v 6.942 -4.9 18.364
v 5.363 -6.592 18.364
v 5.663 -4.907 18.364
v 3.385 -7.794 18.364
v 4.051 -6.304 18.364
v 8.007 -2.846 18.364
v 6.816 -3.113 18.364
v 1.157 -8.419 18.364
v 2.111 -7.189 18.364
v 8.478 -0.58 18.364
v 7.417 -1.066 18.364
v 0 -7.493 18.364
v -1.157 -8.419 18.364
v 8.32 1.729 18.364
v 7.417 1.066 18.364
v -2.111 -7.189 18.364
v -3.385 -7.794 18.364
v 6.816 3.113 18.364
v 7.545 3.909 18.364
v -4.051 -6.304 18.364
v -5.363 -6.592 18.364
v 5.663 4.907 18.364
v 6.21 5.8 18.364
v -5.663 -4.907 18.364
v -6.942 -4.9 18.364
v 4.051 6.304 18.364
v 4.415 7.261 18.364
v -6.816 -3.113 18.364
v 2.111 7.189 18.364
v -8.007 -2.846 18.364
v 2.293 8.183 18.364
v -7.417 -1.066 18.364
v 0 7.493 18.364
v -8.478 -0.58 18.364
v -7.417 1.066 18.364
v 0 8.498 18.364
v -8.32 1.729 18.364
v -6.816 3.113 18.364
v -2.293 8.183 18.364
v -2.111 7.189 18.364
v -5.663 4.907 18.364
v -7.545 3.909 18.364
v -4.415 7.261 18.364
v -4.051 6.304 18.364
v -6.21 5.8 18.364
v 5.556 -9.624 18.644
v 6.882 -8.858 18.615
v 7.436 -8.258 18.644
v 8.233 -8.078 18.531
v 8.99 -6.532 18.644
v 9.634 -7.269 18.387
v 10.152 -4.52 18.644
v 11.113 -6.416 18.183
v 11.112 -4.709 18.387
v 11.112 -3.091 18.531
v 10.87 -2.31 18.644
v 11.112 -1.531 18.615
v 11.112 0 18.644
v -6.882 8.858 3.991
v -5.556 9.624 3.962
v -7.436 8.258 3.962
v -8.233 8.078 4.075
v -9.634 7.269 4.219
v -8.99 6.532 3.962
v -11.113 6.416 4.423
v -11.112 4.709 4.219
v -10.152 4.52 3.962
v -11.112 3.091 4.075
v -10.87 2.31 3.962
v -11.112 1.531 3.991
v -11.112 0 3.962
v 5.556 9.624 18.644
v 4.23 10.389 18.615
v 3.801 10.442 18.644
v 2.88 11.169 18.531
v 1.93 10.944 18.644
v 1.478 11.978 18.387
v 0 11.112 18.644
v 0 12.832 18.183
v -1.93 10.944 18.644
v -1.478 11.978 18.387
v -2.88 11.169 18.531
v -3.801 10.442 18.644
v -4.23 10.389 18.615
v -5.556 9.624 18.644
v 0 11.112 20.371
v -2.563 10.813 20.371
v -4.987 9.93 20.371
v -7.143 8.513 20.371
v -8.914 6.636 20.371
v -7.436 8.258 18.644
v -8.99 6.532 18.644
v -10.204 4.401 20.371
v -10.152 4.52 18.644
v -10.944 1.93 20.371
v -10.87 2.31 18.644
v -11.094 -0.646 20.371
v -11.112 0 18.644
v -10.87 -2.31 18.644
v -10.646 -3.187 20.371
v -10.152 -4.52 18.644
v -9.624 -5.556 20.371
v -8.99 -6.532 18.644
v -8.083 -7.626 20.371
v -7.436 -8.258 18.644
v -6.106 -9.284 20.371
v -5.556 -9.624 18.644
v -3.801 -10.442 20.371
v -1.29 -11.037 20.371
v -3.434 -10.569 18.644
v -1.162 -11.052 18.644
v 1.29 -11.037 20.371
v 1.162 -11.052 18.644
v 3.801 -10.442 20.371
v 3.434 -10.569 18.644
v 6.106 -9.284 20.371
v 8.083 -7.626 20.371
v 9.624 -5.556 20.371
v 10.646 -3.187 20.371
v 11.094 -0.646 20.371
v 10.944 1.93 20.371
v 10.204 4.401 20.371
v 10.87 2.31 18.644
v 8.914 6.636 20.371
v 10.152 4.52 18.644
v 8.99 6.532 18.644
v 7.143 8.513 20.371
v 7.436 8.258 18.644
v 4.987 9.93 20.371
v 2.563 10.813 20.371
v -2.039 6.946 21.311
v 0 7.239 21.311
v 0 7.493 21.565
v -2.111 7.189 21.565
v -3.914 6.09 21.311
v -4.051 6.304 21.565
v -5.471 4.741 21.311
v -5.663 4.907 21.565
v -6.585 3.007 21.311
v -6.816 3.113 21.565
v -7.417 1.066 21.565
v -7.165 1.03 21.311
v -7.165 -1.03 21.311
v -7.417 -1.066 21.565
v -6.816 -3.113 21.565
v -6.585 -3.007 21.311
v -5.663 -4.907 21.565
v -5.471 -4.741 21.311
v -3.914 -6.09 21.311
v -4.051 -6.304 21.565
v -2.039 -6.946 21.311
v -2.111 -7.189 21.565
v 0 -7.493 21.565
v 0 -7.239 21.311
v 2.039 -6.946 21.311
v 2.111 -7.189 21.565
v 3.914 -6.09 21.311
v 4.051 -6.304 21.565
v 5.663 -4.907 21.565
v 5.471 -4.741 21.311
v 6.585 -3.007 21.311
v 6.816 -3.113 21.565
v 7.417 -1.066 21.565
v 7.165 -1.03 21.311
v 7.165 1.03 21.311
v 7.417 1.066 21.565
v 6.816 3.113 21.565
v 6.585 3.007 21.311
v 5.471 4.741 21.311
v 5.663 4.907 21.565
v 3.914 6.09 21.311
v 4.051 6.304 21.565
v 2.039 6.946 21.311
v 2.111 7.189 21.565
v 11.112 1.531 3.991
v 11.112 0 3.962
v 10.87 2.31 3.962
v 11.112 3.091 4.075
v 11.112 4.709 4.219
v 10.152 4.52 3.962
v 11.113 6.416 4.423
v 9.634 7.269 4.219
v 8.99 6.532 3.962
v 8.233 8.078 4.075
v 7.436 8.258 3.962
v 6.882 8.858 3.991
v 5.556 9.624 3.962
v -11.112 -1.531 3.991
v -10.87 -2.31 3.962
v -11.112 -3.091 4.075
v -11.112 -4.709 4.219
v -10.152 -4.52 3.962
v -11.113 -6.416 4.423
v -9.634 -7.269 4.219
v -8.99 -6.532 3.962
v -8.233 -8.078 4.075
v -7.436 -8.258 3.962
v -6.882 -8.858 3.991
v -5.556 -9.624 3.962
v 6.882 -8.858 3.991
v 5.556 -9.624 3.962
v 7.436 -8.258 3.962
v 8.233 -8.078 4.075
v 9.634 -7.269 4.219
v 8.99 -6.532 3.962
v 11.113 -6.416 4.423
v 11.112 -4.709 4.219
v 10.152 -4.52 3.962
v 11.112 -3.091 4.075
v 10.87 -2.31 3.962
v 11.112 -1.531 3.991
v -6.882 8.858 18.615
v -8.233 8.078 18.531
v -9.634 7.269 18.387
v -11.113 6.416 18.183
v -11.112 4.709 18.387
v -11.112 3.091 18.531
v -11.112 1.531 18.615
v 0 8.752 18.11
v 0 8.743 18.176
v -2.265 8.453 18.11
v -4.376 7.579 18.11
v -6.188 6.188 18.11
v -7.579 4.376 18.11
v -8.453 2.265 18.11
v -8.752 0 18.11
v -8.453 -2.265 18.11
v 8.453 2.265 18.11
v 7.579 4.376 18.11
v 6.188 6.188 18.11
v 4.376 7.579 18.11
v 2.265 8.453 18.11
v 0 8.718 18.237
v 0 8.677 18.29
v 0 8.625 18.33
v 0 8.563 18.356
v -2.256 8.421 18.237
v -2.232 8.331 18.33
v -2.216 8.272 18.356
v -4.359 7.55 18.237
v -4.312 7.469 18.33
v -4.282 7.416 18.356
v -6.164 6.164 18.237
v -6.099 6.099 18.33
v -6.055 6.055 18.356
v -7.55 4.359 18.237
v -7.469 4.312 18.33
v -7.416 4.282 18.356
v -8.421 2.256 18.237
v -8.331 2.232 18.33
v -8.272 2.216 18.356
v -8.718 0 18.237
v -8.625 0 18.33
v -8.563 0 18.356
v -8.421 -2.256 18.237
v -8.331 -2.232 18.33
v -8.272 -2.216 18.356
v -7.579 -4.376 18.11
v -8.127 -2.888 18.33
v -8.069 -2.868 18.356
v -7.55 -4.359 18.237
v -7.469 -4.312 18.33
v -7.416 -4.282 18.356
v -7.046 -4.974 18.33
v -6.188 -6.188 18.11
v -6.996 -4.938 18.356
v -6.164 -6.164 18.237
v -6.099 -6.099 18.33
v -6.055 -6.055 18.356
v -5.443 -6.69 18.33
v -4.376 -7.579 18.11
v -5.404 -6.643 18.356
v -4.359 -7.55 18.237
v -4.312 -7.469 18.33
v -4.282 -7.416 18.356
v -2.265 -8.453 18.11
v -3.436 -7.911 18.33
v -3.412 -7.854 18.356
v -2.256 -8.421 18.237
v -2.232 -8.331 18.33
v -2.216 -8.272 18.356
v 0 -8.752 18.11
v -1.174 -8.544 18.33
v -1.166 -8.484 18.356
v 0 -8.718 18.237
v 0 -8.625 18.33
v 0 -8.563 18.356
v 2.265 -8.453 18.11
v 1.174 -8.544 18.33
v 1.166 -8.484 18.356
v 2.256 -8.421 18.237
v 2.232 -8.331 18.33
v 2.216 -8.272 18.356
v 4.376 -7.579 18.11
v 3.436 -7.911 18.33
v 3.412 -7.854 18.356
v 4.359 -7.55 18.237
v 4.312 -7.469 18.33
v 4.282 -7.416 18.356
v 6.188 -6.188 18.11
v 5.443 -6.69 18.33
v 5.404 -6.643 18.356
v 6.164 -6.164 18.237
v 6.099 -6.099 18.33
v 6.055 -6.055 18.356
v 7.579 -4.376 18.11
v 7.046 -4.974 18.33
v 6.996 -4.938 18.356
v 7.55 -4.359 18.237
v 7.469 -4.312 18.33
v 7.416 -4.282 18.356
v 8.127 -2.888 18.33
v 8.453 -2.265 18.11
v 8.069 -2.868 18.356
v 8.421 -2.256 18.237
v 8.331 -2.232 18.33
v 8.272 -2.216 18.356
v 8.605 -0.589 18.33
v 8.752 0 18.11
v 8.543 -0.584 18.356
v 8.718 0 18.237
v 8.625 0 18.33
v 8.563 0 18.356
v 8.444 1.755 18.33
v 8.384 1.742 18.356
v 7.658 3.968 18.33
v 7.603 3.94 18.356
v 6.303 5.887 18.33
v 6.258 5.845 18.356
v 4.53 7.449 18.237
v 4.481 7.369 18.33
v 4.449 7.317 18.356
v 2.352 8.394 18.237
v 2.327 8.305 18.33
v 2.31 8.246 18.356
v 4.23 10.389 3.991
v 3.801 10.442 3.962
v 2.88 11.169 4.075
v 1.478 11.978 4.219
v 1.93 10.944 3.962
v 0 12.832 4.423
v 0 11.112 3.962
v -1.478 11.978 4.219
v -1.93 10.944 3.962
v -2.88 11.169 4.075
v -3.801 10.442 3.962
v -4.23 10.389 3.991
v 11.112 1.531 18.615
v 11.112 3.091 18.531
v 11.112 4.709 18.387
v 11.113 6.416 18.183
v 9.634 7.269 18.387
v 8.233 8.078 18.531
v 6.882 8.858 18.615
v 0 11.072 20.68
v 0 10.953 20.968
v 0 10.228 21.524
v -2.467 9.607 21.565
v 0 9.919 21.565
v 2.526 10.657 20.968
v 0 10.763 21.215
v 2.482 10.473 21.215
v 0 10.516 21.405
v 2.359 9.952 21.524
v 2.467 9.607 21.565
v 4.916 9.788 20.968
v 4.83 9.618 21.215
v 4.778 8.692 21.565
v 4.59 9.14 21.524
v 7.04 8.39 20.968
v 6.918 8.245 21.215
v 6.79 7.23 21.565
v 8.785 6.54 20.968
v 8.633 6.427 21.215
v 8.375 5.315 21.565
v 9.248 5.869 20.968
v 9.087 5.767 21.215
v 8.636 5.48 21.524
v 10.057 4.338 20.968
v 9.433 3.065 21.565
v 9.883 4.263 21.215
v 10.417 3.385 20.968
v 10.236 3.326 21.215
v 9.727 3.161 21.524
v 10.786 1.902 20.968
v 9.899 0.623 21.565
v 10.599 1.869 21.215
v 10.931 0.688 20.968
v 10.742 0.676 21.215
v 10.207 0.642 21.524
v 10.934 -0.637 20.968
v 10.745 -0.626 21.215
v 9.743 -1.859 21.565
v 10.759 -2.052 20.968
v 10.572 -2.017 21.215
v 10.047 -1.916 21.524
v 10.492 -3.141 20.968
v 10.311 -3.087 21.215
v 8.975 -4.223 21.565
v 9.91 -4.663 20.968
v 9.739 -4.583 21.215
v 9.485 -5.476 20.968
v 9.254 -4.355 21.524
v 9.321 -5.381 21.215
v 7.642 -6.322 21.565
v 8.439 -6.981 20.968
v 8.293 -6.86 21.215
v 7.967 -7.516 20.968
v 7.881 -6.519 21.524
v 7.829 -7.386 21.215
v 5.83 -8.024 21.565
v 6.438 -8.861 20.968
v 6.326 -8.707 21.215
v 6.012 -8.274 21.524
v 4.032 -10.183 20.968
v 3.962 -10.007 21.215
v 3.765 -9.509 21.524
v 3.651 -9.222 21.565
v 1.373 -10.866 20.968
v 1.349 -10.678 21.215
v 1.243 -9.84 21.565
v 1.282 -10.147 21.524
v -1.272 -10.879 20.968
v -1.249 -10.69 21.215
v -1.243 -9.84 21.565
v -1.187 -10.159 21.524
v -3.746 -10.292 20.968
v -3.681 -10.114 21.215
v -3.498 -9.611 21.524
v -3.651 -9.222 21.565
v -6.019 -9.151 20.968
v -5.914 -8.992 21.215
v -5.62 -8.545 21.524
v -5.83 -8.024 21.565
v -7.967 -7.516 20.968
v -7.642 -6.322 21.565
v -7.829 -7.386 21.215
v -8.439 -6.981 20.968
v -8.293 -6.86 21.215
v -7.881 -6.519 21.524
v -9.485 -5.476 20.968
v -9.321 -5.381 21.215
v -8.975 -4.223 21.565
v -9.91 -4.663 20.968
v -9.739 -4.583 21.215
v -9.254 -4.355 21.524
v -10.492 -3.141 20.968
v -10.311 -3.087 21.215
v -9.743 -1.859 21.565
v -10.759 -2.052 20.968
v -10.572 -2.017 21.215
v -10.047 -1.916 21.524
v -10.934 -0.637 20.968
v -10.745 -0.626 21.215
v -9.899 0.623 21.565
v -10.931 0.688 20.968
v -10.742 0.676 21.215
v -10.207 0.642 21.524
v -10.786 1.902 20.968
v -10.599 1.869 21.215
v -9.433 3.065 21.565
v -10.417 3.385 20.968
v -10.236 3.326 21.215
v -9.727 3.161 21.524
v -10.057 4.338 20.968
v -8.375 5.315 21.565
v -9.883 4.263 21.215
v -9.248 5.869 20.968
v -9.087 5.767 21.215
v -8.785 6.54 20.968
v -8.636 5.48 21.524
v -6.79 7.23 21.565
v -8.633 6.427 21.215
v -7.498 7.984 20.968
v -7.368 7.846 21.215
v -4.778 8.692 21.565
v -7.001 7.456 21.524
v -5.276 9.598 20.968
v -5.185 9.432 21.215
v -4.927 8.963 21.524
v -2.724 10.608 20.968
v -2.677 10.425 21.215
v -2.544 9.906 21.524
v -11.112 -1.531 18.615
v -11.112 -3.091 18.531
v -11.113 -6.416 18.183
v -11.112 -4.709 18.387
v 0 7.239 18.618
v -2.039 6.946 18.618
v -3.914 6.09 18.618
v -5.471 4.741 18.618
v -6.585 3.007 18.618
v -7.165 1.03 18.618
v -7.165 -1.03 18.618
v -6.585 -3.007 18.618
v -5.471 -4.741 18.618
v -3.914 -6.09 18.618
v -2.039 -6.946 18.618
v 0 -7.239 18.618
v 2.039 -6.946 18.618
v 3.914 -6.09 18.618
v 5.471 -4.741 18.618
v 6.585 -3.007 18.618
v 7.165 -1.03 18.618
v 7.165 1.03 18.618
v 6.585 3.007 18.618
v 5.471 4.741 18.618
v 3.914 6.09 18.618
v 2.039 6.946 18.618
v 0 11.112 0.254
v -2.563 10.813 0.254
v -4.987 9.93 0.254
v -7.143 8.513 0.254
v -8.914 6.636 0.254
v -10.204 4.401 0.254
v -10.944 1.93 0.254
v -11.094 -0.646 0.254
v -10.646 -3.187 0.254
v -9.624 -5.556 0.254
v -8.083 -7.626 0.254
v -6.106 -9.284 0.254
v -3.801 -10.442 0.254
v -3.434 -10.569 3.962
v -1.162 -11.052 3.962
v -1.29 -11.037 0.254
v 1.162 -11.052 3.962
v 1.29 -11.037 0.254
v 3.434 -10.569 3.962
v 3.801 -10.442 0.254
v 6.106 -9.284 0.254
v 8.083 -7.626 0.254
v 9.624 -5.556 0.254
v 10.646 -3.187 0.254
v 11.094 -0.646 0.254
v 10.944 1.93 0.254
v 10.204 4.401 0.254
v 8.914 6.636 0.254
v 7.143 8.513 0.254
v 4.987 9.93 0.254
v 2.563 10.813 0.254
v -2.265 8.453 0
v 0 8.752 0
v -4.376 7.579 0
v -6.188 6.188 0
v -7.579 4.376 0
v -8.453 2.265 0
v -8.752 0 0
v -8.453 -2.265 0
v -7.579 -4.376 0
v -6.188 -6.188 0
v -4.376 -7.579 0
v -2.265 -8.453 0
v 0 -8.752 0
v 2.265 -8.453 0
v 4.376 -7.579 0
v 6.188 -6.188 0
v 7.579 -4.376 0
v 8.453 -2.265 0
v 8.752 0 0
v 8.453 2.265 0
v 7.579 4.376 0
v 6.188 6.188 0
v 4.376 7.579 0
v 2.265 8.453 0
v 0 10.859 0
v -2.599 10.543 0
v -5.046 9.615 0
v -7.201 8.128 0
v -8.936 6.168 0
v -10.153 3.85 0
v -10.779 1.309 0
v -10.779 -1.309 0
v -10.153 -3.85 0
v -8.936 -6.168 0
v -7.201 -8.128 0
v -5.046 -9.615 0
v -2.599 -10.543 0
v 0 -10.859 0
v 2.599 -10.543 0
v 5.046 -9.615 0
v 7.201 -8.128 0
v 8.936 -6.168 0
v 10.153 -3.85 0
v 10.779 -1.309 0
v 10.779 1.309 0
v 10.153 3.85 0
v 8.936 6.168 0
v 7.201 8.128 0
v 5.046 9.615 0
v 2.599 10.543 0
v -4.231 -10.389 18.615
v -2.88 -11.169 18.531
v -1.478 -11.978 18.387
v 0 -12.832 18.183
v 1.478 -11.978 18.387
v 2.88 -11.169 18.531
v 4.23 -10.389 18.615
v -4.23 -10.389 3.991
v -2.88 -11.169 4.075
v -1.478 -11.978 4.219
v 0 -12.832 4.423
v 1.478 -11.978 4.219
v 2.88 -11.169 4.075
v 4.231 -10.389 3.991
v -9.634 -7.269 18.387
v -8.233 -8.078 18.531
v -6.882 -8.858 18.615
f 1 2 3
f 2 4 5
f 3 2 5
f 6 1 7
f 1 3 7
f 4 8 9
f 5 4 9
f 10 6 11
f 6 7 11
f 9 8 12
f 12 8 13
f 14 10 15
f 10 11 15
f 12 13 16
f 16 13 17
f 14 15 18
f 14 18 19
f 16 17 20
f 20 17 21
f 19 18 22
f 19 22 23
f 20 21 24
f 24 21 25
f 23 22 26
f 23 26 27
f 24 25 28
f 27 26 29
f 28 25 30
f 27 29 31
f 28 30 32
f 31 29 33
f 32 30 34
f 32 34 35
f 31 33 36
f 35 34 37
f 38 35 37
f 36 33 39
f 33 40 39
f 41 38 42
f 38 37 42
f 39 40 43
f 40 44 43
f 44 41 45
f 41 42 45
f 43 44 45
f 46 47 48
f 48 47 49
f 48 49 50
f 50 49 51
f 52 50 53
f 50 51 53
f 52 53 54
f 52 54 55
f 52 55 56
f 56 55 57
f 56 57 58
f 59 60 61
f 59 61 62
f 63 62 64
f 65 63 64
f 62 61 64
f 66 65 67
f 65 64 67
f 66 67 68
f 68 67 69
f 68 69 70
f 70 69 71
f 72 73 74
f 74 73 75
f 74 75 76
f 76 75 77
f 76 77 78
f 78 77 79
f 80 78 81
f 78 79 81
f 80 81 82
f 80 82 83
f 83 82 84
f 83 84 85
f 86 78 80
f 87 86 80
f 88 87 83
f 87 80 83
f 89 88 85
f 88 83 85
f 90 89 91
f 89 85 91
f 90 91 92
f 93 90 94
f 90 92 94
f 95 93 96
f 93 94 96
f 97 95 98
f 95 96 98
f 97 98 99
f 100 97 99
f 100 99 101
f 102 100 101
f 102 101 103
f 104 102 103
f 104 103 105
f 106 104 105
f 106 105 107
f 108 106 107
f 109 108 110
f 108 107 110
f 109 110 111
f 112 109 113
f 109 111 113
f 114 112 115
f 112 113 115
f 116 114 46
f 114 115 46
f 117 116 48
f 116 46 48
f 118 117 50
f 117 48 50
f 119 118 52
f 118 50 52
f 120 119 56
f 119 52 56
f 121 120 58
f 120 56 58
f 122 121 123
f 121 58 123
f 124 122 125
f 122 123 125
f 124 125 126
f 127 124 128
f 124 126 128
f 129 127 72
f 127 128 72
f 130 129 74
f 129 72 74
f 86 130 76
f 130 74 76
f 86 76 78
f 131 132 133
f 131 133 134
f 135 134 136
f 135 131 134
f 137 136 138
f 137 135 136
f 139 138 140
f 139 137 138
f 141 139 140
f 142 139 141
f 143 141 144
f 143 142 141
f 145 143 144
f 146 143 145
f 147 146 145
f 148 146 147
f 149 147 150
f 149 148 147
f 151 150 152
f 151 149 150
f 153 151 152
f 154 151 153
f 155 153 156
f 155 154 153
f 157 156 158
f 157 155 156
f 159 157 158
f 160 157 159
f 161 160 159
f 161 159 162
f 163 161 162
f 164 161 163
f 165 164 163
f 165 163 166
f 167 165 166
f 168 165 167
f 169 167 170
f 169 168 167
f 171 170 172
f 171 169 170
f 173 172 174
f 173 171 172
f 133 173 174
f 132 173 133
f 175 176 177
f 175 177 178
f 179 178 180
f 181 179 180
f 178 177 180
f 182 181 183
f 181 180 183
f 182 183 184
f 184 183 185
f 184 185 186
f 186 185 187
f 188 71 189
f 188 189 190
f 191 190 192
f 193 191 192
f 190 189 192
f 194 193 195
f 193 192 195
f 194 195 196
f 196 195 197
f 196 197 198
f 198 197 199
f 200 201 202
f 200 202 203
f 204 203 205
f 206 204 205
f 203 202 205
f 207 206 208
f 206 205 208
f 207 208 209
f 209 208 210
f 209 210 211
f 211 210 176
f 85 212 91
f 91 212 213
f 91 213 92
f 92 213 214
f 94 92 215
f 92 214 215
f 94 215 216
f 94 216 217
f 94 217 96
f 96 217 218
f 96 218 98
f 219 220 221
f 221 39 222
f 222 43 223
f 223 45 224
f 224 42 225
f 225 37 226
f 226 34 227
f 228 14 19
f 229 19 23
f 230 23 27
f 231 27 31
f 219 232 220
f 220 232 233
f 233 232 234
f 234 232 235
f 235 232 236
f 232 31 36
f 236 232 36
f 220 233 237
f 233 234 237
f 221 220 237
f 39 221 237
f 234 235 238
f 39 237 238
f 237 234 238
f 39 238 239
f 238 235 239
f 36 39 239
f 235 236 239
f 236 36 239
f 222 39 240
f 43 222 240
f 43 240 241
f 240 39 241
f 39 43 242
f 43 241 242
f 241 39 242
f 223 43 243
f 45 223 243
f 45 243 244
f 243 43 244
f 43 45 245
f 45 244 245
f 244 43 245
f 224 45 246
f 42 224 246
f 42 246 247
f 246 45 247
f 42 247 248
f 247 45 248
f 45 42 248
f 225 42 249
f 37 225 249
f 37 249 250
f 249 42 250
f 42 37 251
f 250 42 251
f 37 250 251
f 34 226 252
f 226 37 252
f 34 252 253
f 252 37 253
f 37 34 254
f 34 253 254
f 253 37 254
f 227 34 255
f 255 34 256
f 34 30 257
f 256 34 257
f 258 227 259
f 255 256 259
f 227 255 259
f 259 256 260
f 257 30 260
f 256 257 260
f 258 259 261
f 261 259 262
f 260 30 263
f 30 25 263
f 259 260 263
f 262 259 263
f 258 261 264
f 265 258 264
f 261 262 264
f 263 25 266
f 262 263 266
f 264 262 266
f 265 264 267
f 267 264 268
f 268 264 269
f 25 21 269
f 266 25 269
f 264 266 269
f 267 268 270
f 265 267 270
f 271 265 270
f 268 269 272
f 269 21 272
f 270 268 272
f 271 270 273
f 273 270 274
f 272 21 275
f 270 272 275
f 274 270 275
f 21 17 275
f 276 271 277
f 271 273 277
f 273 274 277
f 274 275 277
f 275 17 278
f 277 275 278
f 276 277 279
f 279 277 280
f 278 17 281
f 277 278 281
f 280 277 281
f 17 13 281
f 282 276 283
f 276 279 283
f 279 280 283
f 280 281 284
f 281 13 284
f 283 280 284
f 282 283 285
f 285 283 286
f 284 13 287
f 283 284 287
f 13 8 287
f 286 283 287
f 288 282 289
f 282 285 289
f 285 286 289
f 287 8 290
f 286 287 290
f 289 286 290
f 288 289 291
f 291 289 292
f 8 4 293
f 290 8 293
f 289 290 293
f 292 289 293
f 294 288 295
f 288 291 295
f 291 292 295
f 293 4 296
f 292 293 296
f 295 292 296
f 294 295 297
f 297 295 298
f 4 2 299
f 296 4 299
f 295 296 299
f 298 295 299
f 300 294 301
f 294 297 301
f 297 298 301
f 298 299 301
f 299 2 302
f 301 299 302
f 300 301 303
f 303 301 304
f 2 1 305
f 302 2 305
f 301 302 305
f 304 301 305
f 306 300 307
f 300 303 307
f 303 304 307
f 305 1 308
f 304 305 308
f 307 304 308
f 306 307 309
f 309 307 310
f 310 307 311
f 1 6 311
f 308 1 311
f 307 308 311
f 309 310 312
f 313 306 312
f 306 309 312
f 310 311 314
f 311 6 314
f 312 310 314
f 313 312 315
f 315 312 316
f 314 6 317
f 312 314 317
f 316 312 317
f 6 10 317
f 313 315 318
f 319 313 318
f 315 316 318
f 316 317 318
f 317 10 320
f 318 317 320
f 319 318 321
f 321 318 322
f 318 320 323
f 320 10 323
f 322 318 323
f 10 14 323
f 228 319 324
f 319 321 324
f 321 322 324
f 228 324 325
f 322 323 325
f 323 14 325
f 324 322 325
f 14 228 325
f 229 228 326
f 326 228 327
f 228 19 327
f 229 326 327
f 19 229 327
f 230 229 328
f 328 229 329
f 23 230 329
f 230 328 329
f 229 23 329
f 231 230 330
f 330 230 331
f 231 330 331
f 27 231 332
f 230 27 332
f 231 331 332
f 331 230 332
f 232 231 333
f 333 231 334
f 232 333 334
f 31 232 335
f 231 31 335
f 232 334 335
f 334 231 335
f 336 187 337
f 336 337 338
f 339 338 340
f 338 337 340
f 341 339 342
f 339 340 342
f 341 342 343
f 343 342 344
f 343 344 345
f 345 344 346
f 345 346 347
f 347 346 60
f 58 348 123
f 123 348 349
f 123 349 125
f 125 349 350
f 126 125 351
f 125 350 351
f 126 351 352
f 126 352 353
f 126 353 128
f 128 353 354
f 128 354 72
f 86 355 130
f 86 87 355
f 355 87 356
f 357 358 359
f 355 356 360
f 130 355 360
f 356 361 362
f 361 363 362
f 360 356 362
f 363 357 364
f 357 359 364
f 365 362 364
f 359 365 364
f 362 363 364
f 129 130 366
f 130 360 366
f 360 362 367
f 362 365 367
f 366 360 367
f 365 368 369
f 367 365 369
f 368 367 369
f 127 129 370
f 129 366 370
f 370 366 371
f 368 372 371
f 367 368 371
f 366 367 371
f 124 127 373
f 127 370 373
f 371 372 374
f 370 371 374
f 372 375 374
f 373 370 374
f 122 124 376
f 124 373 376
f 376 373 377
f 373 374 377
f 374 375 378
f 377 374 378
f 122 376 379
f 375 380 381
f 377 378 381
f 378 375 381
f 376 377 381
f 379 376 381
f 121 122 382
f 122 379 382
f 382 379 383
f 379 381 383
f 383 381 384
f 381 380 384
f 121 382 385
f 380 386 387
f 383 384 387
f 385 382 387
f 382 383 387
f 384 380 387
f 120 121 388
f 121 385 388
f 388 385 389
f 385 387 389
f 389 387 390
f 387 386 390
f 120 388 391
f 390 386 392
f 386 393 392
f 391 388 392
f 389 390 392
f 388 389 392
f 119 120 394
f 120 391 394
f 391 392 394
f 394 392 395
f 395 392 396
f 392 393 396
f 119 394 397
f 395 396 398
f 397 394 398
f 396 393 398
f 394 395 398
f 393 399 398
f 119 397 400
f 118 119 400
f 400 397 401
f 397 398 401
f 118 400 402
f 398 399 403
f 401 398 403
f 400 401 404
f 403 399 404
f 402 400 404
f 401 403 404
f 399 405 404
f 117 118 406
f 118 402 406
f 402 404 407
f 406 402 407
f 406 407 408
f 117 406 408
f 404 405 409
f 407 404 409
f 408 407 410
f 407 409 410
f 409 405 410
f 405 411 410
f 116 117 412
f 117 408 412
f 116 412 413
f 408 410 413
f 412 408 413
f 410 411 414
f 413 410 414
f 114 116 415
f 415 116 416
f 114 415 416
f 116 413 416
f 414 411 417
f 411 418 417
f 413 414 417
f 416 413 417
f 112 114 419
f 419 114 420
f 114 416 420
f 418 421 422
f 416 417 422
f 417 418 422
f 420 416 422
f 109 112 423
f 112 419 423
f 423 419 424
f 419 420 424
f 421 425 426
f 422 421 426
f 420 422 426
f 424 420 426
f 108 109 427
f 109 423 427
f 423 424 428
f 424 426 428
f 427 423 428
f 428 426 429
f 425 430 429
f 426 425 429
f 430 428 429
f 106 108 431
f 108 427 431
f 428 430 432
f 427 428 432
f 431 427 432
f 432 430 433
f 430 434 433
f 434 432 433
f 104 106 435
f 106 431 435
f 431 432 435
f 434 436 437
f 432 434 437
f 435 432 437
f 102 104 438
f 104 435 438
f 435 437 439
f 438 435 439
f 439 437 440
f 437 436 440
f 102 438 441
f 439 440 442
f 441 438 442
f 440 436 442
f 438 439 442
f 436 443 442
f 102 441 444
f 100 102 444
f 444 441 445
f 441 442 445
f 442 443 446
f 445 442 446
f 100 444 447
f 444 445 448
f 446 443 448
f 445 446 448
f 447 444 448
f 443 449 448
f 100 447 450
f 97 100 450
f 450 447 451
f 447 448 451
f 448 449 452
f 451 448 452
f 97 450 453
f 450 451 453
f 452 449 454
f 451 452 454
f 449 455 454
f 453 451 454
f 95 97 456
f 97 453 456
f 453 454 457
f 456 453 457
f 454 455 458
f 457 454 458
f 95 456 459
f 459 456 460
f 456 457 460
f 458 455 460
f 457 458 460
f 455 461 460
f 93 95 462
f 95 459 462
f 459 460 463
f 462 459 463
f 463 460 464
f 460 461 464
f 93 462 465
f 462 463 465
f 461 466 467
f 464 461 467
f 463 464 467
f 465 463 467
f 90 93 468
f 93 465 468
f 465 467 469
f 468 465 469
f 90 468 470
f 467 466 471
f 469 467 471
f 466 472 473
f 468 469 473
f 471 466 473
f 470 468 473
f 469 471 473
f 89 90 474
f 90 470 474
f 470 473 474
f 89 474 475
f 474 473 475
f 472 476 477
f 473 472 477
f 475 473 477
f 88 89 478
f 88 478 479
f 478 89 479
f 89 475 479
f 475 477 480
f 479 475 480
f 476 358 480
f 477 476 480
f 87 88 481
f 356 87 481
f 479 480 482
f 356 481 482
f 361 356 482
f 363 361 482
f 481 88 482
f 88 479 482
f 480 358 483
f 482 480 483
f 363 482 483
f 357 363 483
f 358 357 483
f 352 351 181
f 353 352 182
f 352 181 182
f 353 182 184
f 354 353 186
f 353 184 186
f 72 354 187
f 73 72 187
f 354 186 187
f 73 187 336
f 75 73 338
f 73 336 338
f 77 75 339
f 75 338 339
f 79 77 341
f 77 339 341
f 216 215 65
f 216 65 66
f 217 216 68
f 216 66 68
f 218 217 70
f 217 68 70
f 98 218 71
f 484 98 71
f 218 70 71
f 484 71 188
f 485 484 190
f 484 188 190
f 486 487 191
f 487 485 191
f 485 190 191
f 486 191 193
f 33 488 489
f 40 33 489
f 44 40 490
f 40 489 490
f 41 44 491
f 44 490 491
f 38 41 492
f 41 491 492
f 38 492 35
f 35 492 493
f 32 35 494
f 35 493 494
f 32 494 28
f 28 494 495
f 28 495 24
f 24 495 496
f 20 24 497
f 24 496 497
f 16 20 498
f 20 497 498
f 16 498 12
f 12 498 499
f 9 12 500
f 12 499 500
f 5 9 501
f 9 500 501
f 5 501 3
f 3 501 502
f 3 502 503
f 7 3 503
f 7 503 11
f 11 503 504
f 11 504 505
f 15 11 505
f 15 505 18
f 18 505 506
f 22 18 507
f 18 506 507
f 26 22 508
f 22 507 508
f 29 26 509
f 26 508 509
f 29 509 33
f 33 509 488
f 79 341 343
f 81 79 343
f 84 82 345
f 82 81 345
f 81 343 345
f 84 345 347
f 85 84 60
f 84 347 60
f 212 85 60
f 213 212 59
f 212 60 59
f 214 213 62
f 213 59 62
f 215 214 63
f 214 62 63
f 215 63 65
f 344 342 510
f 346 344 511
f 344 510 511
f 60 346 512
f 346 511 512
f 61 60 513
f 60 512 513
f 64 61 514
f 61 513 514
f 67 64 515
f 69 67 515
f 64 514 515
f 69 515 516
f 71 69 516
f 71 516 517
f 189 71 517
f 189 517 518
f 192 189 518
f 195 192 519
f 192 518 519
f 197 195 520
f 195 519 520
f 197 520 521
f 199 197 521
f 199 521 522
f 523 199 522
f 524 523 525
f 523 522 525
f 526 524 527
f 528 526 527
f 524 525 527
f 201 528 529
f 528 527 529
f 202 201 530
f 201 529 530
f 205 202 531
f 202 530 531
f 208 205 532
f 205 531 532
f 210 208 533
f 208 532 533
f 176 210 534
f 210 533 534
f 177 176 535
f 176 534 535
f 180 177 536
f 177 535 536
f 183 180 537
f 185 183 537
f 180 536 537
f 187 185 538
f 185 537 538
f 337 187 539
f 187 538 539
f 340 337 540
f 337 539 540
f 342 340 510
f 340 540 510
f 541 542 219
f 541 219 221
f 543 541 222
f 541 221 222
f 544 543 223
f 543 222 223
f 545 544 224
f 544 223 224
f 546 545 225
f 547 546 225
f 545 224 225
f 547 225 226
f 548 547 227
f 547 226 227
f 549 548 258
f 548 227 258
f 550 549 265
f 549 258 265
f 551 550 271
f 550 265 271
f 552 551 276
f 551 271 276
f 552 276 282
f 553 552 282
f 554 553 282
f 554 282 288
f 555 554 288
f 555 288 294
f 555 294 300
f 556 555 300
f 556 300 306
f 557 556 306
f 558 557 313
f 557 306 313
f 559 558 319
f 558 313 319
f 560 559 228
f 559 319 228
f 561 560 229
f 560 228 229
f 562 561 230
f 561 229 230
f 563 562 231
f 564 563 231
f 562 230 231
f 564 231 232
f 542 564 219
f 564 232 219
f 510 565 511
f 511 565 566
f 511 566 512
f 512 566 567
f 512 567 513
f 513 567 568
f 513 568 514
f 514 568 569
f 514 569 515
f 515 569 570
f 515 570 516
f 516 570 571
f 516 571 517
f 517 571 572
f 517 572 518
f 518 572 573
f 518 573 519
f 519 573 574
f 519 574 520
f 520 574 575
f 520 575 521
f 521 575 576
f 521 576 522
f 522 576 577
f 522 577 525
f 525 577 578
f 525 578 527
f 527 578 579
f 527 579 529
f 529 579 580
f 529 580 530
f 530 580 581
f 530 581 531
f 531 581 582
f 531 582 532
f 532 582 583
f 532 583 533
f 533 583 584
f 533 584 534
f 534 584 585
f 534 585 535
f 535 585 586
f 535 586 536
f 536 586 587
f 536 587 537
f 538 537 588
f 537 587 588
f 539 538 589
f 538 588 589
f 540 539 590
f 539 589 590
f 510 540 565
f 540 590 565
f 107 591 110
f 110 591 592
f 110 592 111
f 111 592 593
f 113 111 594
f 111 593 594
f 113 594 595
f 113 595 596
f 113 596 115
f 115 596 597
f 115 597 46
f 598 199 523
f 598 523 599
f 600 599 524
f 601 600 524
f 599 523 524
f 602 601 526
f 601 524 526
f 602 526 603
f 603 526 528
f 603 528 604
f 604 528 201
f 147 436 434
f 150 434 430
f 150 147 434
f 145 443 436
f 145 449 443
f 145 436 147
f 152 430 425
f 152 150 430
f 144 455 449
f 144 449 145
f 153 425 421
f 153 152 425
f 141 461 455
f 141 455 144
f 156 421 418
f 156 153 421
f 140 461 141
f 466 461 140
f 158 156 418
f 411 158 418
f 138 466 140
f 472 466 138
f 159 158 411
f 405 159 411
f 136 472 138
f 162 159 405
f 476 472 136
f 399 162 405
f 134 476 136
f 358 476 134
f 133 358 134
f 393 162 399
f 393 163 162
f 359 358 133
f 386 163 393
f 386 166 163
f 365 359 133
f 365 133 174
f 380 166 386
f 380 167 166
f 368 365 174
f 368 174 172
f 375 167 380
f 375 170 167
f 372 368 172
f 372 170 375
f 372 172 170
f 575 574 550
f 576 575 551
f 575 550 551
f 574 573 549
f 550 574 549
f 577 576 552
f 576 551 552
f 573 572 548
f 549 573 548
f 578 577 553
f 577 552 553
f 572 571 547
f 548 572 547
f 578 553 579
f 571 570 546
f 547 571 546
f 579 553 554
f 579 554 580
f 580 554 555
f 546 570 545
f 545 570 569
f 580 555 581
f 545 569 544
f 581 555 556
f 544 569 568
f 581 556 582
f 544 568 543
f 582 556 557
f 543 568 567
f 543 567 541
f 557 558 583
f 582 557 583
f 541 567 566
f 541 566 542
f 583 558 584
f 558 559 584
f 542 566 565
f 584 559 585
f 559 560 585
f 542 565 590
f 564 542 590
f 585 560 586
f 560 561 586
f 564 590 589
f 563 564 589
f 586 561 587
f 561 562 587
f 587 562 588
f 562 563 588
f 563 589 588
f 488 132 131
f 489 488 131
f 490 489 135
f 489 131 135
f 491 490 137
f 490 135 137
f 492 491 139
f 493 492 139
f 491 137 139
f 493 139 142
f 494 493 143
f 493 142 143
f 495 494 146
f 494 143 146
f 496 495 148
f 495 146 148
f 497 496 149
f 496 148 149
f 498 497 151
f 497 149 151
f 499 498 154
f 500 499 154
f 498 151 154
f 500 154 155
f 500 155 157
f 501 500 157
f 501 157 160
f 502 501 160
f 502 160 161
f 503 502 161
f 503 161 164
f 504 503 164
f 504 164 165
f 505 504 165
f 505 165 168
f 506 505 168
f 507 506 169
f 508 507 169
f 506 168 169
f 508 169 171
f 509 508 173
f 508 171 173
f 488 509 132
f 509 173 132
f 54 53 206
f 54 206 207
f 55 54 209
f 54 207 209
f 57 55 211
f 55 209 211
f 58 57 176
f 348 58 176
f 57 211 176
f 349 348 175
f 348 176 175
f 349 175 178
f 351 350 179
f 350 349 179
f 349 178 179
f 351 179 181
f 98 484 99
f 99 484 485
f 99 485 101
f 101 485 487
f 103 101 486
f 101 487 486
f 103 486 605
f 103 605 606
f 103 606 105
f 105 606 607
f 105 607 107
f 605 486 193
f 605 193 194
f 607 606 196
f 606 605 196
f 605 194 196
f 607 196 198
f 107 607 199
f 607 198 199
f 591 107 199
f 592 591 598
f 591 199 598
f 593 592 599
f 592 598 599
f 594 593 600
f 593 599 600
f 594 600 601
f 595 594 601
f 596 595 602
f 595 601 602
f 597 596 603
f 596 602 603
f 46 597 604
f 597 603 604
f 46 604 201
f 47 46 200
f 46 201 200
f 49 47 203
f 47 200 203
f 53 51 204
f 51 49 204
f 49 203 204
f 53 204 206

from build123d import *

# Parameters (mm, degrees)
BOSS_EXTRUDE1_DEPTH = 21.5646
FILLET1_R           = 1.1938
CHAMFER1_SIZE       = 0.254
CHAMFER2_SIZE       = 0.254


with BuildPart() as part:
    # Sketch1 → Boss-Extrude1 (new body)
    with BuildSketch(Plane.XY):
        Polygon((0, 12.831609733), (-11.1125, 6.415804866), (-11.1125, -6.415804866), (0, -12.831609733), (11.1125, -6.415804866), (11.1125, 6.415804866), align=None)
    extrude(amount=BOSS_EXTRUDE1_DEPTH)

    # Sketch2 → Cut-Revolve1 (revolve, cut)
    with BuildSketch(Plane(origin=(0, 0, 0), x_dir=(0, 0, -1), z_dir=(1, 0, 0))):
        Polygon((-21.5646, 14.550719465), (-21.5646, 11.1125), (-18.6436, 11.1125), (-18.182965935, 12.831609733), (-4.423034065, 12.831609733), (-3.9624, 11.1125), (0, 11.1125), (0, 14.550719465), align=None)
        with BuildLine():
            Line((-21.5646, 7.239), (-21.5646, 0))
            Line((-21.5646, 0), (0, 0))
            Line((0, 0), (0, 8.751666378))
            Line((0, 8.751666378), (-18.1102, 8.751666378))
            ThreePointArc((-18.1102, 8.751666378), (-18.289805122, 8.6772715), (-18.3642, 8.497666378))
            Line((-18.3642, 8.497666378), (-18.3642, 7.239))
            Line((-18.3642, 7.239), (-21.5646, 7.239))
        make_face()
    revolve(axis=Axis((0, 0, 0), (0, 0, 1)), mode=Mode.SUBTRACT)

    # Fillet1
    fillet1_edges = [part.edges().sort_by_distance(p)[0] for p in [
        (0, -11.1125, 21.5646),
    ]]
    fillet(fillet1_edges, radius=FILLET1_R)

    # Chamfer1
    chamfer1_edges = [part.edges().sort_by_distance(p)[0] for p in [
        (0, -11.1125, 0),
    ]]
    chamfer(chamfer1_edges, length=CHAMFER1_SIZE)

    # Chamfer2
    chamfer2_edges = [part.edges().sort_by_distance(p)[0] for p in [
        (0, -7.239, 21.5646),
        (0, -7.239, 18.3642),
    ]]
    chamfer(chamfer2_edges, length=CHAMFER2_SIZE)


solid = part.part
